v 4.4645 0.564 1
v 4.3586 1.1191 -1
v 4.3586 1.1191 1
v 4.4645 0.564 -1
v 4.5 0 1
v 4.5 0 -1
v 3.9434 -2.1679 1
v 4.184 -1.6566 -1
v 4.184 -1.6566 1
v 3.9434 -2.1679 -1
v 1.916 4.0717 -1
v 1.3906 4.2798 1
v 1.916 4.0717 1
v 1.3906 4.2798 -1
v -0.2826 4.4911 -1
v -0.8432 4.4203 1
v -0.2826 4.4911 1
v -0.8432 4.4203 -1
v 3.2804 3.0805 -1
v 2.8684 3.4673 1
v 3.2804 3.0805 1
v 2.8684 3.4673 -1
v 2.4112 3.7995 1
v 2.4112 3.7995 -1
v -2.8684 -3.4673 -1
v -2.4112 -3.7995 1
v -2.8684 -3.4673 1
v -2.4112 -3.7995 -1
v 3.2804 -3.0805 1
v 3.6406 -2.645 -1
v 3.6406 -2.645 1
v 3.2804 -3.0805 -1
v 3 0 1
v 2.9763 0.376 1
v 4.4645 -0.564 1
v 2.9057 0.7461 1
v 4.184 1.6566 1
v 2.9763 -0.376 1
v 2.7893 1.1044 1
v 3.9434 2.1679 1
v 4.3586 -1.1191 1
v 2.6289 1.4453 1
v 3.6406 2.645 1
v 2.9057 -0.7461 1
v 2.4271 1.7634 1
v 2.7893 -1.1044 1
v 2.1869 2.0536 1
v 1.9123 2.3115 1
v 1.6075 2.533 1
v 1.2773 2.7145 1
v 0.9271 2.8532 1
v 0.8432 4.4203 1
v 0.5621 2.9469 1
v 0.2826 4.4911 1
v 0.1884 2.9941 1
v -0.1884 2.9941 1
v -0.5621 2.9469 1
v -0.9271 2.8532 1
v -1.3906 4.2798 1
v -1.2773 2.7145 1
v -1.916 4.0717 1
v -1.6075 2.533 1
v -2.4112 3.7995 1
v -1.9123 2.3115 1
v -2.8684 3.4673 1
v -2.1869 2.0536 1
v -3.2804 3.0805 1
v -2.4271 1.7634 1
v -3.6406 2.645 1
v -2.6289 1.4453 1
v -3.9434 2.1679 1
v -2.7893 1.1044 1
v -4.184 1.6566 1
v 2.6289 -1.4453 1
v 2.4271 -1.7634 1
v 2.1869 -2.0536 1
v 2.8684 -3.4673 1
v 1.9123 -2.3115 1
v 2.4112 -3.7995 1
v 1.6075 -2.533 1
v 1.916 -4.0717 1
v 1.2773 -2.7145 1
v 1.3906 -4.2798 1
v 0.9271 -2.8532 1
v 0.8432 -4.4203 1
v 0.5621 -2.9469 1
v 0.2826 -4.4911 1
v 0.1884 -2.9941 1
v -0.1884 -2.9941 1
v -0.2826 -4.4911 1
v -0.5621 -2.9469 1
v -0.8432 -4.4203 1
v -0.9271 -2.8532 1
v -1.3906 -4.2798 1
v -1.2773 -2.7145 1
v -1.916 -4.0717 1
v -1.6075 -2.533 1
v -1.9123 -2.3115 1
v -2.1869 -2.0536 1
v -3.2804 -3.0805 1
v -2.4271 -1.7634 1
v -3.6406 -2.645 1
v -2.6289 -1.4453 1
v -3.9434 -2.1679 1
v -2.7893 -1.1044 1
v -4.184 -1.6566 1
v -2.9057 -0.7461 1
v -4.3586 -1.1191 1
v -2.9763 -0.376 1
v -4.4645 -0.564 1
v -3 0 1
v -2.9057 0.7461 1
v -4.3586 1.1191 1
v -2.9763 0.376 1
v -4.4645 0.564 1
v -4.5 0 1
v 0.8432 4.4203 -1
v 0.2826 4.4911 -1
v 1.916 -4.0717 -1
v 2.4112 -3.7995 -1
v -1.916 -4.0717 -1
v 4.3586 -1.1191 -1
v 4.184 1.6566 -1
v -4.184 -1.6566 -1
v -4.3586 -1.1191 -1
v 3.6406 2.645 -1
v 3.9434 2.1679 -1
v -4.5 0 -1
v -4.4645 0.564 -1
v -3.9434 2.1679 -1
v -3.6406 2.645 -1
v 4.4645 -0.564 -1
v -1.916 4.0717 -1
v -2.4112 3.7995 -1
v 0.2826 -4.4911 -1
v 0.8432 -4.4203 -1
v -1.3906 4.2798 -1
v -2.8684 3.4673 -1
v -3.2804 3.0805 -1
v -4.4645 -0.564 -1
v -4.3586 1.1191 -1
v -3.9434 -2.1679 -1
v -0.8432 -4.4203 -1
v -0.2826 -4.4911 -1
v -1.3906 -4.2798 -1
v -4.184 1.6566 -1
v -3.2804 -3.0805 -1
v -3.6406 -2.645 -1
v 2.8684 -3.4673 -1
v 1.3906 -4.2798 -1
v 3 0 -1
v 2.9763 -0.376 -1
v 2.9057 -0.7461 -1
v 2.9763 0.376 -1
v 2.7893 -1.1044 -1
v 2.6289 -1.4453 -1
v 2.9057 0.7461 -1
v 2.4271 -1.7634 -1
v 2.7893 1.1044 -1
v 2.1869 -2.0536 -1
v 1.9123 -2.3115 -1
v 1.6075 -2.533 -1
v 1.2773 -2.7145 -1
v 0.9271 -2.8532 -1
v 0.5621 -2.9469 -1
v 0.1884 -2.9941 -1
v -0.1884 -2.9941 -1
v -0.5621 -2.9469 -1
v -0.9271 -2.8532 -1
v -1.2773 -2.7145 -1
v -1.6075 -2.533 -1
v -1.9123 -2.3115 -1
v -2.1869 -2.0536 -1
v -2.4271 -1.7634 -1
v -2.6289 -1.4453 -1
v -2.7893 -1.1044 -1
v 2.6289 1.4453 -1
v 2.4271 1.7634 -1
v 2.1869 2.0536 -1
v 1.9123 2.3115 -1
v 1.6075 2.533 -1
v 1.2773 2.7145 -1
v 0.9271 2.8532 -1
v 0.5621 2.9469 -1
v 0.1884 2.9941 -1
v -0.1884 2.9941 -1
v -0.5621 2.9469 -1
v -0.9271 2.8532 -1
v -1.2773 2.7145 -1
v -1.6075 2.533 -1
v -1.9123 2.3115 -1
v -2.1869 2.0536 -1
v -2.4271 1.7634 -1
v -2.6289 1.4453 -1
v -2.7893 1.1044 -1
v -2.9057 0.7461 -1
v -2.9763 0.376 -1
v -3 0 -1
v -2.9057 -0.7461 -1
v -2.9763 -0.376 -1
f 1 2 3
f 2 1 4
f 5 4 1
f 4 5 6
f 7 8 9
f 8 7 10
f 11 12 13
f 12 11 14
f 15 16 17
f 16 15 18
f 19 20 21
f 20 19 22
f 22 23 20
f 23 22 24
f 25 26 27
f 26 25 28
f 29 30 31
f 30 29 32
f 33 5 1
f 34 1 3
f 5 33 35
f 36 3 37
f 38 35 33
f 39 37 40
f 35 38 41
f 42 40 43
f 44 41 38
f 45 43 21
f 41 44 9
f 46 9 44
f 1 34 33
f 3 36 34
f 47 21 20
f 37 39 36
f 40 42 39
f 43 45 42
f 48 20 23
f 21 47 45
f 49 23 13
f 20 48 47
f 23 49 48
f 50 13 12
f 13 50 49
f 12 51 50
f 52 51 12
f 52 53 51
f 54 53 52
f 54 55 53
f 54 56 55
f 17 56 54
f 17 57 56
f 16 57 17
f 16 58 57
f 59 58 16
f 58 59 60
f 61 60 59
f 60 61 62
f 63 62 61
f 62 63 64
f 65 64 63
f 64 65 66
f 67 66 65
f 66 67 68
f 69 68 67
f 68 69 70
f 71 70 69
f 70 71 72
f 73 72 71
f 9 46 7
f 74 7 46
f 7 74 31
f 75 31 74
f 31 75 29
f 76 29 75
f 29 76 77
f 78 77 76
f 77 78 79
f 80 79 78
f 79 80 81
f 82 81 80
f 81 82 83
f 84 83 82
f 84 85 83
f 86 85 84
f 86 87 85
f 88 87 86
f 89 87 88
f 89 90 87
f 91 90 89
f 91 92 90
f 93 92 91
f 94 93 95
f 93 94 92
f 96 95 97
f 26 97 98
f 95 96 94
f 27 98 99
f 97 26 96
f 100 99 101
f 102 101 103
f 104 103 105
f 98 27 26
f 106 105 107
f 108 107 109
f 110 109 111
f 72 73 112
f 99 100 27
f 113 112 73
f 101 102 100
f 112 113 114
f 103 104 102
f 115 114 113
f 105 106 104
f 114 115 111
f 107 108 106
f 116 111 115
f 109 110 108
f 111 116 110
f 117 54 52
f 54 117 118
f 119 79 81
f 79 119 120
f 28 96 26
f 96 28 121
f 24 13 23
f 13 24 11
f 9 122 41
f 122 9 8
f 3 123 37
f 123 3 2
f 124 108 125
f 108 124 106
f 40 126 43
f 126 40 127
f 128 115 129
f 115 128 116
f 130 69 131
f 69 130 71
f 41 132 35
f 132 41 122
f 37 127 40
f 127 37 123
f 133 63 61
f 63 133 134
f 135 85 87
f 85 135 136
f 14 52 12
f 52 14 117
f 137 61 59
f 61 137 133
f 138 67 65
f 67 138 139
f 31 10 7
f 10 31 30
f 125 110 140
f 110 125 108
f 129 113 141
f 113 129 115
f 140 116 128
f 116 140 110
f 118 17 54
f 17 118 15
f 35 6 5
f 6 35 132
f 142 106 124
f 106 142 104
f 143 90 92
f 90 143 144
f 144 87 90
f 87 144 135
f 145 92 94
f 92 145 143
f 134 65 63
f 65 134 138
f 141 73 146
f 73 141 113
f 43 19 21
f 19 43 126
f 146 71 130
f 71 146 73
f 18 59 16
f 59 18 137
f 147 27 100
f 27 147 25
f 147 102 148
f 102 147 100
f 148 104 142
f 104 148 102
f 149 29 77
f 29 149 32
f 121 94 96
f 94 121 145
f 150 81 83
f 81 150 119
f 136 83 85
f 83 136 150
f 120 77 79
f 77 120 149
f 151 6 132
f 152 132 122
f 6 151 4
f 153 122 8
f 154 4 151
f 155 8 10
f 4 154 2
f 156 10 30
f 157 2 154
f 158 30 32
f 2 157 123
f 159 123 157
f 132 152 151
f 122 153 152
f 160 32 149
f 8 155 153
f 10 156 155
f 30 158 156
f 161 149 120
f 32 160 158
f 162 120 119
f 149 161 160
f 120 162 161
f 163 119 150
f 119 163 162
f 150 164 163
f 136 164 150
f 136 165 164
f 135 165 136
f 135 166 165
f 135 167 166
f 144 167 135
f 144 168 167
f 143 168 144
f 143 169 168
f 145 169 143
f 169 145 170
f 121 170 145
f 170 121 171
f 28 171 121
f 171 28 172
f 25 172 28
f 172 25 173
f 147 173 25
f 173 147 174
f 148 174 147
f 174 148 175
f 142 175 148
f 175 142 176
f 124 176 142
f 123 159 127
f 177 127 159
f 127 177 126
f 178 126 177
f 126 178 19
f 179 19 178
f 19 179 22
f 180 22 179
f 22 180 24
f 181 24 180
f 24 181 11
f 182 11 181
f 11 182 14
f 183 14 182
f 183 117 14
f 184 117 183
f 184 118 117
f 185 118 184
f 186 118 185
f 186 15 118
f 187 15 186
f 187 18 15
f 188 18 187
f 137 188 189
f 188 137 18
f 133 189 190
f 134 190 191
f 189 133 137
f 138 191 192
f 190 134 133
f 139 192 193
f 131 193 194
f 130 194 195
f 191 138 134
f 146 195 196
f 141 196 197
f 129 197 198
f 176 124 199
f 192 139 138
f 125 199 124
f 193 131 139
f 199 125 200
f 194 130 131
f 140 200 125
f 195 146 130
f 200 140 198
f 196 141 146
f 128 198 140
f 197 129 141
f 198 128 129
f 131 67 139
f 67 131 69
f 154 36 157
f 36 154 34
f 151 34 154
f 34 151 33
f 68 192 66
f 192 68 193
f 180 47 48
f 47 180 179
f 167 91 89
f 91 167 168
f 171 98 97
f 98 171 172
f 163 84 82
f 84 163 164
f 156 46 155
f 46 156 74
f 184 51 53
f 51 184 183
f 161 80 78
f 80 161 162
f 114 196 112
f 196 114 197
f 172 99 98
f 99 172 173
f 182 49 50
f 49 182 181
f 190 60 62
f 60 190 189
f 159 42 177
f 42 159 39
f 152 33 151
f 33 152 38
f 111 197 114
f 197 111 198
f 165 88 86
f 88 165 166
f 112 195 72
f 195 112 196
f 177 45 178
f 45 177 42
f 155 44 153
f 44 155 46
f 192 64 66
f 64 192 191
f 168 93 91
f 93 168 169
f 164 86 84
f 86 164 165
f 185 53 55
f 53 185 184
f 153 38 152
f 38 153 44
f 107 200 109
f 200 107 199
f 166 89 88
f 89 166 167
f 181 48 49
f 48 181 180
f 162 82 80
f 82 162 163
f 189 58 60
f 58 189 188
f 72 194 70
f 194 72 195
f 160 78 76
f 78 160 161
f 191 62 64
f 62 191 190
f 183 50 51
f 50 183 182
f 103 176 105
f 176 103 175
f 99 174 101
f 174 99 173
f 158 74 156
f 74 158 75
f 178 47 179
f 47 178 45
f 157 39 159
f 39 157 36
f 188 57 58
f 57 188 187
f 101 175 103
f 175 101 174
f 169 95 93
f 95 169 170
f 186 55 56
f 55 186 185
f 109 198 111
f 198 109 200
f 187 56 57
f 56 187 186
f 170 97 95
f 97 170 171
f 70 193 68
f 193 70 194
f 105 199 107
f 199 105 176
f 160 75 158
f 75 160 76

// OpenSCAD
$fn = 50;


difference() {
	union() {
		translate(v = [0, 0, -1.0000000000]) {
			cylinder(h = 2, r = 4.5000000000);
		}
	}
	union() {
		translate(v = [0, 0, -100.0000000000]) {
			cylinder(h = 200, r = 3.0000000000);
		}
	}
}
